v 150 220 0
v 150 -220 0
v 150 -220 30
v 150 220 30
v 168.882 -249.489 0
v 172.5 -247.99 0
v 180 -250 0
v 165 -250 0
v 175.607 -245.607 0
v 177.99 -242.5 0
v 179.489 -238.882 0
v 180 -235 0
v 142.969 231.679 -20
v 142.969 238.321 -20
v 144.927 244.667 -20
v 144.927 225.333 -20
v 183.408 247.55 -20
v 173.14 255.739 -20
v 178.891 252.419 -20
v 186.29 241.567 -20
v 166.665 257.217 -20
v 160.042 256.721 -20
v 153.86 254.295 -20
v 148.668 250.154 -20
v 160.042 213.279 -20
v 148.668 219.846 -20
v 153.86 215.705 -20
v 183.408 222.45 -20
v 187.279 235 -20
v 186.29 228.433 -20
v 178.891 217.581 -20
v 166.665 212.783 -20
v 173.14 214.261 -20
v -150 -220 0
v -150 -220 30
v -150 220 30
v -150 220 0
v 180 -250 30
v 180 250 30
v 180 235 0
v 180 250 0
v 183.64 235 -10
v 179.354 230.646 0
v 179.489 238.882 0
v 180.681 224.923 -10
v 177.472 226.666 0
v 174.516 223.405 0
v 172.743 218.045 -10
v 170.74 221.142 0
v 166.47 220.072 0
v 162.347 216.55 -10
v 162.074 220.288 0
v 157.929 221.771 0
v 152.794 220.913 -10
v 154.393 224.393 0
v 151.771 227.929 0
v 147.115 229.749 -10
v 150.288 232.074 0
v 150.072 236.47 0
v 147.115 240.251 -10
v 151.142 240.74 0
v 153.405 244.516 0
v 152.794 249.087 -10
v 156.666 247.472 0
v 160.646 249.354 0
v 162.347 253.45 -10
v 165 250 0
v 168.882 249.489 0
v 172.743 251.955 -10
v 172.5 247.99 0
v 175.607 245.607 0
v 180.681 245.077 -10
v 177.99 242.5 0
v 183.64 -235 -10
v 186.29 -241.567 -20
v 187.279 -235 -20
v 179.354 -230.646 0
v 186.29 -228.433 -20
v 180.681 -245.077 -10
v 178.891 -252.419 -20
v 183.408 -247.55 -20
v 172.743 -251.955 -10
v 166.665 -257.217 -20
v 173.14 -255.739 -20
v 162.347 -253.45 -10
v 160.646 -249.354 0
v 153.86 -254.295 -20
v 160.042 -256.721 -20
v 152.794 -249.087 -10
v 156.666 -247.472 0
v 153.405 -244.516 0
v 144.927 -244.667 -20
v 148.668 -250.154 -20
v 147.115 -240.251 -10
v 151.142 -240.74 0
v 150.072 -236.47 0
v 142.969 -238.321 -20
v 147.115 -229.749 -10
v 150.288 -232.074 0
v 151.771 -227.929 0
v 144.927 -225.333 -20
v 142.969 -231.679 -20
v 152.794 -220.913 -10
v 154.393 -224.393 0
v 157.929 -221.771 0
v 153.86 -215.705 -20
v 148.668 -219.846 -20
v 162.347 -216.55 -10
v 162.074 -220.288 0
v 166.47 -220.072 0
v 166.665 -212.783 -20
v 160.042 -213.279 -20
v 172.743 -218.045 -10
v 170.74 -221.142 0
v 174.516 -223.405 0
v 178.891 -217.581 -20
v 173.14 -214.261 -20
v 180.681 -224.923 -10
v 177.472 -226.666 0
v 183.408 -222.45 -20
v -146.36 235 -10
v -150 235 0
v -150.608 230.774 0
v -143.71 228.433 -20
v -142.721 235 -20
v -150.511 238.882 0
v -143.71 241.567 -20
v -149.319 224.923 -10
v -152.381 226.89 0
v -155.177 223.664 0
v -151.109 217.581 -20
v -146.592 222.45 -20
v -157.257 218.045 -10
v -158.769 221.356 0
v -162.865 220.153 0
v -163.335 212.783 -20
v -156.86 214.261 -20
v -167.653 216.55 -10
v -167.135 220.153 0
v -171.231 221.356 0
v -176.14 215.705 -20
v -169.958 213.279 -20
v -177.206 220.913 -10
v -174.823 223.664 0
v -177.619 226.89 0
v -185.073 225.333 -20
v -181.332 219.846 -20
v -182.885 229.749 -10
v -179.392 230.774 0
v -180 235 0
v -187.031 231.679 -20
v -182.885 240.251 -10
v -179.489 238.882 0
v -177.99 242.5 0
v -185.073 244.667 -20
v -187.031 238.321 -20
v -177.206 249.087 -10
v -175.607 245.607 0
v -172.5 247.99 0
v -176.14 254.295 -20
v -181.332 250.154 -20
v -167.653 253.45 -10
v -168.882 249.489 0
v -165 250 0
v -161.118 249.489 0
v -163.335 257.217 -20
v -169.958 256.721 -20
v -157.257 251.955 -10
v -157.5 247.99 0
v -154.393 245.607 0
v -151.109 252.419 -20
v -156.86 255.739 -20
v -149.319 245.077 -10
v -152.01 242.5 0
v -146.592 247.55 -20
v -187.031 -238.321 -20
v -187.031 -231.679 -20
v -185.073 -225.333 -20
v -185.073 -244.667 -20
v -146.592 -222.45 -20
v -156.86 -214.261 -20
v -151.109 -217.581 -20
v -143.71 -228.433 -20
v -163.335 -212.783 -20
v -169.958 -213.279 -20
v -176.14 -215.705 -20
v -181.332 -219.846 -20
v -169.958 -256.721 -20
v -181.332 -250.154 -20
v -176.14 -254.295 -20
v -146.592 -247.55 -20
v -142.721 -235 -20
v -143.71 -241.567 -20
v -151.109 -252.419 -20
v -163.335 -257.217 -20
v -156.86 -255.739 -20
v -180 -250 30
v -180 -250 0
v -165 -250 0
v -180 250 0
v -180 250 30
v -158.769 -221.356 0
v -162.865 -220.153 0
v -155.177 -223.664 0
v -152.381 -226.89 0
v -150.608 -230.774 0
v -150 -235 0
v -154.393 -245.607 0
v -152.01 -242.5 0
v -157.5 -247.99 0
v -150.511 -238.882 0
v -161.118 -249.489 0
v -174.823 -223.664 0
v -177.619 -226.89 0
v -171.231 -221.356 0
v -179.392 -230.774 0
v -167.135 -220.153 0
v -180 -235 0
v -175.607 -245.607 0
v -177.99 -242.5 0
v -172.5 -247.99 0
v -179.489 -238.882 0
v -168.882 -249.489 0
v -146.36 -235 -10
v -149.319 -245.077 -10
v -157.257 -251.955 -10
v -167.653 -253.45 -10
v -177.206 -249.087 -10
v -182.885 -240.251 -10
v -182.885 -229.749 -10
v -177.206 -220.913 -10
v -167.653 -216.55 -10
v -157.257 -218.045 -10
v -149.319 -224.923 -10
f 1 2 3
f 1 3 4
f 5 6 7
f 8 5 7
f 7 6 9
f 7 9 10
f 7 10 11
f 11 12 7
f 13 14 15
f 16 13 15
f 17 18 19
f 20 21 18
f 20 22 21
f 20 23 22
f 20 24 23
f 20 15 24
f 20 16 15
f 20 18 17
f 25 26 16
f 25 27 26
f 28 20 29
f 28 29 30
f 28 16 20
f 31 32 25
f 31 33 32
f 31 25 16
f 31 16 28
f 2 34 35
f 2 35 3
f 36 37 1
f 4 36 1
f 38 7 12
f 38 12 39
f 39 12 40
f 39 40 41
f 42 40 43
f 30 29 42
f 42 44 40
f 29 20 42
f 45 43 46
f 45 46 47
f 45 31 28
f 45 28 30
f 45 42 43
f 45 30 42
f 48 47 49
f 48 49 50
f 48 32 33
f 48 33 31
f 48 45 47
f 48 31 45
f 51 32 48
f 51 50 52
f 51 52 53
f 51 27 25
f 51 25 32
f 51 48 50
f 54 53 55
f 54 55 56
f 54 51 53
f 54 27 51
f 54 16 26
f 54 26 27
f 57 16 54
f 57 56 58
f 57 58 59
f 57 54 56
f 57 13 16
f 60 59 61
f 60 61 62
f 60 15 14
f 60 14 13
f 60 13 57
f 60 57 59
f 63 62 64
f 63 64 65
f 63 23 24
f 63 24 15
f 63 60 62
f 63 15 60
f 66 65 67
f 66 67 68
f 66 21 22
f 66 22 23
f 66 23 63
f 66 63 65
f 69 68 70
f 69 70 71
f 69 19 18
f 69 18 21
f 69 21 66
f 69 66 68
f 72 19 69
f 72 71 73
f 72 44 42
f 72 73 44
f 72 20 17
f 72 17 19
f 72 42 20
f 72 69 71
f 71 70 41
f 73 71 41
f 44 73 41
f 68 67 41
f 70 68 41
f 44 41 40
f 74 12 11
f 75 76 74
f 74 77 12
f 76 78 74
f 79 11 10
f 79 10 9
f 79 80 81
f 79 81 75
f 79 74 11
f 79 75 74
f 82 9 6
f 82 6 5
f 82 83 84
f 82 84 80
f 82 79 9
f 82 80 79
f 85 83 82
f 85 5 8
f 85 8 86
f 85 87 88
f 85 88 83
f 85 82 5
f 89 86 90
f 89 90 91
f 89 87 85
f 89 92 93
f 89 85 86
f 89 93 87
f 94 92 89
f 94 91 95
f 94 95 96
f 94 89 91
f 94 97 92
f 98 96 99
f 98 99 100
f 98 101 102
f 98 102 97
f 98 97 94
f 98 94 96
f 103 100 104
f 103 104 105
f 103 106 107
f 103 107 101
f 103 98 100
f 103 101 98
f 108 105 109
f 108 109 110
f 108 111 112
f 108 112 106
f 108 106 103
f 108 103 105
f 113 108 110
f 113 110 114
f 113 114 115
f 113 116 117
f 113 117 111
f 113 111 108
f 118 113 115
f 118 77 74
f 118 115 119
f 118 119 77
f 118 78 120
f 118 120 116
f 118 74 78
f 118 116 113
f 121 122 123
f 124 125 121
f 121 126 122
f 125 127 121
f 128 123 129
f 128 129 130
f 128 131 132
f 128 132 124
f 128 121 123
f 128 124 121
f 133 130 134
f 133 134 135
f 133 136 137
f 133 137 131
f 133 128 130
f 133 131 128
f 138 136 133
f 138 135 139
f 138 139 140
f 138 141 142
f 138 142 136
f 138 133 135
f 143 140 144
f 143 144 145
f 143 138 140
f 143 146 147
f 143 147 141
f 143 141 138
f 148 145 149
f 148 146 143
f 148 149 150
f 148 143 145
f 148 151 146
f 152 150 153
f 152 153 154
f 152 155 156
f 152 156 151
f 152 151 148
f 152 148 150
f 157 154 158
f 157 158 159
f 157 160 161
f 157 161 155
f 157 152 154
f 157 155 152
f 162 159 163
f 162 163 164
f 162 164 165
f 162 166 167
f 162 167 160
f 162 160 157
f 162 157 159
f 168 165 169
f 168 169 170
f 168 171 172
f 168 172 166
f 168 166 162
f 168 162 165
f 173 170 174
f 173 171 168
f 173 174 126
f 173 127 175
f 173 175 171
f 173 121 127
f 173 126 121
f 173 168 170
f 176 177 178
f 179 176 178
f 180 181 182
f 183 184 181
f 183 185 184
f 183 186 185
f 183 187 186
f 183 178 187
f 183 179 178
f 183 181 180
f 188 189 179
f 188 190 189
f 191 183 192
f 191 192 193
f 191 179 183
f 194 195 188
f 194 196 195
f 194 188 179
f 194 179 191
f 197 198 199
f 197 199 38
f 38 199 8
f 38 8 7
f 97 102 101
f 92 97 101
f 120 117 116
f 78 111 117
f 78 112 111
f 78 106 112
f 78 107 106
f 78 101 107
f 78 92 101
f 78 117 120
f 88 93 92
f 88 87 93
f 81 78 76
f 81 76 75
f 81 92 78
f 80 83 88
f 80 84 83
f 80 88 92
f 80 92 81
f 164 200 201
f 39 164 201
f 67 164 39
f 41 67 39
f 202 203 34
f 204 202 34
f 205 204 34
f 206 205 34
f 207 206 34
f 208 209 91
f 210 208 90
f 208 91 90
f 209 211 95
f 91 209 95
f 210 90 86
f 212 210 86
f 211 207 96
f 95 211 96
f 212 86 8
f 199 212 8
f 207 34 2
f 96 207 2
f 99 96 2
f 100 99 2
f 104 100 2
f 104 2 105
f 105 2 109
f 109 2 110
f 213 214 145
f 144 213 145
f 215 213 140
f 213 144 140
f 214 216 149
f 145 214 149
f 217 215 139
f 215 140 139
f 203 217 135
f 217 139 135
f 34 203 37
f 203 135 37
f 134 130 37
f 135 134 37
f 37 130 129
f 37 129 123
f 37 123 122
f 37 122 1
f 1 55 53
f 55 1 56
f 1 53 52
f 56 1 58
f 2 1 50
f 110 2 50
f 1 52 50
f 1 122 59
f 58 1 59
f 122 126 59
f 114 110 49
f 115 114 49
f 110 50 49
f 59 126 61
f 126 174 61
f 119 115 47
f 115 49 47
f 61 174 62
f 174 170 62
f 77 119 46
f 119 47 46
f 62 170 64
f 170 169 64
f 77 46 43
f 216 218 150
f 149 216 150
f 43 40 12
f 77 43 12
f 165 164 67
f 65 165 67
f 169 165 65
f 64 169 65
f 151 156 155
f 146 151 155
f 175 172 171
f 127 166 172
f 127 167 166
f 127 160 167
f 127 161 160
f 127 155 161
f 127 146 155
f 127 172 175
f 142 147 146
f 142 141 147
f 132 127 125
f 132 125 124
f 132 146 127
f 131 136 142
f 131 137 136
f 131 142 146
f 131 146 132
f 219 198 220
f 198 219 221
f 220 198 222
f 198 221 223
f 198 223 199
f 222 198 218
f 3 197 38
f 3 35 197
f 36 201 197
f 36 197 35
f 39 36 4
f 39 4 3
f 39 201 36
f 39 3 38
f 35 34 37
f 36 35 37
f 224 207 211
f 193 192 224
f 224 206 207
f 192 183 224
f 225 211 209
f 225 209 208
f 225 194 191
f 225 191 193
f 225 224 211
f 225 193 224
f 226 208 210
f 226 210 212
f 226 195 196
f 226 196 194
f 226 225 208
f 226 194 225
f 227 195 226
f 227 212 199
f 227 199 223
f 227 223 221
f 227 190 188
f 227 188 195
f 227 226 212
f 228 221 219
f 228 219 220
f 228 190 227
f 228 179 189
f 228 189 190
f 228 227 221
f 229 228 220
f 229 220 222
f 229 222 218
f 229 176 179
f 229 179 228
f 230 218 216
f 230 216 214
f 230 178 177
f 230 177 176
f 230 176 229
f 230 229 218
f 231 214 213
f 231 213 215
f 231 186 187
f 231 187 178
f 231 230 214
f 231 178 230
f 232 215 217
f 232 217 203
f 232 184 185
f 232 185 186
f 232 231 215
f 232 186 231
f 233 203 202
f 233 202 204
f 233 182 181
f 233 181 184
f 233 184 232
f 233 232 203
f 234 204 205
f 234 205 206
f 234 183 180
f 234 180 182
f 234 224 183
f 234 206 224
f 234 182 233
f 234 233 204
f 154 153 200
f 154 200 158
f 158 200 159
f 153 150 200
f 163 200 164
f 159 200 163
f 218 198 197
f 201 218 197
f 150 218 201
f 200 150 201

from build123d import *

# Parameters (mm, degrees)
F0_W     = 360
F0_H     = 500
F0_W_2   = 300
F0_H_2   = 440
F1_DEPTH = 30
F2_R     = 15
F3_DEPTH = 20
F3_TAPER = -20


with BuildPart() as f1:
    # F0 (on Top) → F1 (new body)
    with BuildSketch(Plane.XY):
        Rectangle(F0_W, F0_H)
        Rectangle(F0_W_2, F0_H_2, mode=Mode.SUBTRACT)
    extrude(amount=F1_DEPTH)

    # F2 (on face) → F3 (join)
    with BuildSketch(Plane(origin=(0, 0, 0), x_dir=(1, 0, 0), z_dir=(0, 0, -1))):
        with Locations((-165, 235)):
            Circle(F2_R)
        with Locations((-165, -235)):
            Circle(F2_R)
        with Locations((165, 235)):
            Circle(F2_R)
        with Locations((165, -235)):
            Circle(F2_R)
    extrude(amount=F3_DEPTH, taper=F3_TAPER)


solid = f1.part
